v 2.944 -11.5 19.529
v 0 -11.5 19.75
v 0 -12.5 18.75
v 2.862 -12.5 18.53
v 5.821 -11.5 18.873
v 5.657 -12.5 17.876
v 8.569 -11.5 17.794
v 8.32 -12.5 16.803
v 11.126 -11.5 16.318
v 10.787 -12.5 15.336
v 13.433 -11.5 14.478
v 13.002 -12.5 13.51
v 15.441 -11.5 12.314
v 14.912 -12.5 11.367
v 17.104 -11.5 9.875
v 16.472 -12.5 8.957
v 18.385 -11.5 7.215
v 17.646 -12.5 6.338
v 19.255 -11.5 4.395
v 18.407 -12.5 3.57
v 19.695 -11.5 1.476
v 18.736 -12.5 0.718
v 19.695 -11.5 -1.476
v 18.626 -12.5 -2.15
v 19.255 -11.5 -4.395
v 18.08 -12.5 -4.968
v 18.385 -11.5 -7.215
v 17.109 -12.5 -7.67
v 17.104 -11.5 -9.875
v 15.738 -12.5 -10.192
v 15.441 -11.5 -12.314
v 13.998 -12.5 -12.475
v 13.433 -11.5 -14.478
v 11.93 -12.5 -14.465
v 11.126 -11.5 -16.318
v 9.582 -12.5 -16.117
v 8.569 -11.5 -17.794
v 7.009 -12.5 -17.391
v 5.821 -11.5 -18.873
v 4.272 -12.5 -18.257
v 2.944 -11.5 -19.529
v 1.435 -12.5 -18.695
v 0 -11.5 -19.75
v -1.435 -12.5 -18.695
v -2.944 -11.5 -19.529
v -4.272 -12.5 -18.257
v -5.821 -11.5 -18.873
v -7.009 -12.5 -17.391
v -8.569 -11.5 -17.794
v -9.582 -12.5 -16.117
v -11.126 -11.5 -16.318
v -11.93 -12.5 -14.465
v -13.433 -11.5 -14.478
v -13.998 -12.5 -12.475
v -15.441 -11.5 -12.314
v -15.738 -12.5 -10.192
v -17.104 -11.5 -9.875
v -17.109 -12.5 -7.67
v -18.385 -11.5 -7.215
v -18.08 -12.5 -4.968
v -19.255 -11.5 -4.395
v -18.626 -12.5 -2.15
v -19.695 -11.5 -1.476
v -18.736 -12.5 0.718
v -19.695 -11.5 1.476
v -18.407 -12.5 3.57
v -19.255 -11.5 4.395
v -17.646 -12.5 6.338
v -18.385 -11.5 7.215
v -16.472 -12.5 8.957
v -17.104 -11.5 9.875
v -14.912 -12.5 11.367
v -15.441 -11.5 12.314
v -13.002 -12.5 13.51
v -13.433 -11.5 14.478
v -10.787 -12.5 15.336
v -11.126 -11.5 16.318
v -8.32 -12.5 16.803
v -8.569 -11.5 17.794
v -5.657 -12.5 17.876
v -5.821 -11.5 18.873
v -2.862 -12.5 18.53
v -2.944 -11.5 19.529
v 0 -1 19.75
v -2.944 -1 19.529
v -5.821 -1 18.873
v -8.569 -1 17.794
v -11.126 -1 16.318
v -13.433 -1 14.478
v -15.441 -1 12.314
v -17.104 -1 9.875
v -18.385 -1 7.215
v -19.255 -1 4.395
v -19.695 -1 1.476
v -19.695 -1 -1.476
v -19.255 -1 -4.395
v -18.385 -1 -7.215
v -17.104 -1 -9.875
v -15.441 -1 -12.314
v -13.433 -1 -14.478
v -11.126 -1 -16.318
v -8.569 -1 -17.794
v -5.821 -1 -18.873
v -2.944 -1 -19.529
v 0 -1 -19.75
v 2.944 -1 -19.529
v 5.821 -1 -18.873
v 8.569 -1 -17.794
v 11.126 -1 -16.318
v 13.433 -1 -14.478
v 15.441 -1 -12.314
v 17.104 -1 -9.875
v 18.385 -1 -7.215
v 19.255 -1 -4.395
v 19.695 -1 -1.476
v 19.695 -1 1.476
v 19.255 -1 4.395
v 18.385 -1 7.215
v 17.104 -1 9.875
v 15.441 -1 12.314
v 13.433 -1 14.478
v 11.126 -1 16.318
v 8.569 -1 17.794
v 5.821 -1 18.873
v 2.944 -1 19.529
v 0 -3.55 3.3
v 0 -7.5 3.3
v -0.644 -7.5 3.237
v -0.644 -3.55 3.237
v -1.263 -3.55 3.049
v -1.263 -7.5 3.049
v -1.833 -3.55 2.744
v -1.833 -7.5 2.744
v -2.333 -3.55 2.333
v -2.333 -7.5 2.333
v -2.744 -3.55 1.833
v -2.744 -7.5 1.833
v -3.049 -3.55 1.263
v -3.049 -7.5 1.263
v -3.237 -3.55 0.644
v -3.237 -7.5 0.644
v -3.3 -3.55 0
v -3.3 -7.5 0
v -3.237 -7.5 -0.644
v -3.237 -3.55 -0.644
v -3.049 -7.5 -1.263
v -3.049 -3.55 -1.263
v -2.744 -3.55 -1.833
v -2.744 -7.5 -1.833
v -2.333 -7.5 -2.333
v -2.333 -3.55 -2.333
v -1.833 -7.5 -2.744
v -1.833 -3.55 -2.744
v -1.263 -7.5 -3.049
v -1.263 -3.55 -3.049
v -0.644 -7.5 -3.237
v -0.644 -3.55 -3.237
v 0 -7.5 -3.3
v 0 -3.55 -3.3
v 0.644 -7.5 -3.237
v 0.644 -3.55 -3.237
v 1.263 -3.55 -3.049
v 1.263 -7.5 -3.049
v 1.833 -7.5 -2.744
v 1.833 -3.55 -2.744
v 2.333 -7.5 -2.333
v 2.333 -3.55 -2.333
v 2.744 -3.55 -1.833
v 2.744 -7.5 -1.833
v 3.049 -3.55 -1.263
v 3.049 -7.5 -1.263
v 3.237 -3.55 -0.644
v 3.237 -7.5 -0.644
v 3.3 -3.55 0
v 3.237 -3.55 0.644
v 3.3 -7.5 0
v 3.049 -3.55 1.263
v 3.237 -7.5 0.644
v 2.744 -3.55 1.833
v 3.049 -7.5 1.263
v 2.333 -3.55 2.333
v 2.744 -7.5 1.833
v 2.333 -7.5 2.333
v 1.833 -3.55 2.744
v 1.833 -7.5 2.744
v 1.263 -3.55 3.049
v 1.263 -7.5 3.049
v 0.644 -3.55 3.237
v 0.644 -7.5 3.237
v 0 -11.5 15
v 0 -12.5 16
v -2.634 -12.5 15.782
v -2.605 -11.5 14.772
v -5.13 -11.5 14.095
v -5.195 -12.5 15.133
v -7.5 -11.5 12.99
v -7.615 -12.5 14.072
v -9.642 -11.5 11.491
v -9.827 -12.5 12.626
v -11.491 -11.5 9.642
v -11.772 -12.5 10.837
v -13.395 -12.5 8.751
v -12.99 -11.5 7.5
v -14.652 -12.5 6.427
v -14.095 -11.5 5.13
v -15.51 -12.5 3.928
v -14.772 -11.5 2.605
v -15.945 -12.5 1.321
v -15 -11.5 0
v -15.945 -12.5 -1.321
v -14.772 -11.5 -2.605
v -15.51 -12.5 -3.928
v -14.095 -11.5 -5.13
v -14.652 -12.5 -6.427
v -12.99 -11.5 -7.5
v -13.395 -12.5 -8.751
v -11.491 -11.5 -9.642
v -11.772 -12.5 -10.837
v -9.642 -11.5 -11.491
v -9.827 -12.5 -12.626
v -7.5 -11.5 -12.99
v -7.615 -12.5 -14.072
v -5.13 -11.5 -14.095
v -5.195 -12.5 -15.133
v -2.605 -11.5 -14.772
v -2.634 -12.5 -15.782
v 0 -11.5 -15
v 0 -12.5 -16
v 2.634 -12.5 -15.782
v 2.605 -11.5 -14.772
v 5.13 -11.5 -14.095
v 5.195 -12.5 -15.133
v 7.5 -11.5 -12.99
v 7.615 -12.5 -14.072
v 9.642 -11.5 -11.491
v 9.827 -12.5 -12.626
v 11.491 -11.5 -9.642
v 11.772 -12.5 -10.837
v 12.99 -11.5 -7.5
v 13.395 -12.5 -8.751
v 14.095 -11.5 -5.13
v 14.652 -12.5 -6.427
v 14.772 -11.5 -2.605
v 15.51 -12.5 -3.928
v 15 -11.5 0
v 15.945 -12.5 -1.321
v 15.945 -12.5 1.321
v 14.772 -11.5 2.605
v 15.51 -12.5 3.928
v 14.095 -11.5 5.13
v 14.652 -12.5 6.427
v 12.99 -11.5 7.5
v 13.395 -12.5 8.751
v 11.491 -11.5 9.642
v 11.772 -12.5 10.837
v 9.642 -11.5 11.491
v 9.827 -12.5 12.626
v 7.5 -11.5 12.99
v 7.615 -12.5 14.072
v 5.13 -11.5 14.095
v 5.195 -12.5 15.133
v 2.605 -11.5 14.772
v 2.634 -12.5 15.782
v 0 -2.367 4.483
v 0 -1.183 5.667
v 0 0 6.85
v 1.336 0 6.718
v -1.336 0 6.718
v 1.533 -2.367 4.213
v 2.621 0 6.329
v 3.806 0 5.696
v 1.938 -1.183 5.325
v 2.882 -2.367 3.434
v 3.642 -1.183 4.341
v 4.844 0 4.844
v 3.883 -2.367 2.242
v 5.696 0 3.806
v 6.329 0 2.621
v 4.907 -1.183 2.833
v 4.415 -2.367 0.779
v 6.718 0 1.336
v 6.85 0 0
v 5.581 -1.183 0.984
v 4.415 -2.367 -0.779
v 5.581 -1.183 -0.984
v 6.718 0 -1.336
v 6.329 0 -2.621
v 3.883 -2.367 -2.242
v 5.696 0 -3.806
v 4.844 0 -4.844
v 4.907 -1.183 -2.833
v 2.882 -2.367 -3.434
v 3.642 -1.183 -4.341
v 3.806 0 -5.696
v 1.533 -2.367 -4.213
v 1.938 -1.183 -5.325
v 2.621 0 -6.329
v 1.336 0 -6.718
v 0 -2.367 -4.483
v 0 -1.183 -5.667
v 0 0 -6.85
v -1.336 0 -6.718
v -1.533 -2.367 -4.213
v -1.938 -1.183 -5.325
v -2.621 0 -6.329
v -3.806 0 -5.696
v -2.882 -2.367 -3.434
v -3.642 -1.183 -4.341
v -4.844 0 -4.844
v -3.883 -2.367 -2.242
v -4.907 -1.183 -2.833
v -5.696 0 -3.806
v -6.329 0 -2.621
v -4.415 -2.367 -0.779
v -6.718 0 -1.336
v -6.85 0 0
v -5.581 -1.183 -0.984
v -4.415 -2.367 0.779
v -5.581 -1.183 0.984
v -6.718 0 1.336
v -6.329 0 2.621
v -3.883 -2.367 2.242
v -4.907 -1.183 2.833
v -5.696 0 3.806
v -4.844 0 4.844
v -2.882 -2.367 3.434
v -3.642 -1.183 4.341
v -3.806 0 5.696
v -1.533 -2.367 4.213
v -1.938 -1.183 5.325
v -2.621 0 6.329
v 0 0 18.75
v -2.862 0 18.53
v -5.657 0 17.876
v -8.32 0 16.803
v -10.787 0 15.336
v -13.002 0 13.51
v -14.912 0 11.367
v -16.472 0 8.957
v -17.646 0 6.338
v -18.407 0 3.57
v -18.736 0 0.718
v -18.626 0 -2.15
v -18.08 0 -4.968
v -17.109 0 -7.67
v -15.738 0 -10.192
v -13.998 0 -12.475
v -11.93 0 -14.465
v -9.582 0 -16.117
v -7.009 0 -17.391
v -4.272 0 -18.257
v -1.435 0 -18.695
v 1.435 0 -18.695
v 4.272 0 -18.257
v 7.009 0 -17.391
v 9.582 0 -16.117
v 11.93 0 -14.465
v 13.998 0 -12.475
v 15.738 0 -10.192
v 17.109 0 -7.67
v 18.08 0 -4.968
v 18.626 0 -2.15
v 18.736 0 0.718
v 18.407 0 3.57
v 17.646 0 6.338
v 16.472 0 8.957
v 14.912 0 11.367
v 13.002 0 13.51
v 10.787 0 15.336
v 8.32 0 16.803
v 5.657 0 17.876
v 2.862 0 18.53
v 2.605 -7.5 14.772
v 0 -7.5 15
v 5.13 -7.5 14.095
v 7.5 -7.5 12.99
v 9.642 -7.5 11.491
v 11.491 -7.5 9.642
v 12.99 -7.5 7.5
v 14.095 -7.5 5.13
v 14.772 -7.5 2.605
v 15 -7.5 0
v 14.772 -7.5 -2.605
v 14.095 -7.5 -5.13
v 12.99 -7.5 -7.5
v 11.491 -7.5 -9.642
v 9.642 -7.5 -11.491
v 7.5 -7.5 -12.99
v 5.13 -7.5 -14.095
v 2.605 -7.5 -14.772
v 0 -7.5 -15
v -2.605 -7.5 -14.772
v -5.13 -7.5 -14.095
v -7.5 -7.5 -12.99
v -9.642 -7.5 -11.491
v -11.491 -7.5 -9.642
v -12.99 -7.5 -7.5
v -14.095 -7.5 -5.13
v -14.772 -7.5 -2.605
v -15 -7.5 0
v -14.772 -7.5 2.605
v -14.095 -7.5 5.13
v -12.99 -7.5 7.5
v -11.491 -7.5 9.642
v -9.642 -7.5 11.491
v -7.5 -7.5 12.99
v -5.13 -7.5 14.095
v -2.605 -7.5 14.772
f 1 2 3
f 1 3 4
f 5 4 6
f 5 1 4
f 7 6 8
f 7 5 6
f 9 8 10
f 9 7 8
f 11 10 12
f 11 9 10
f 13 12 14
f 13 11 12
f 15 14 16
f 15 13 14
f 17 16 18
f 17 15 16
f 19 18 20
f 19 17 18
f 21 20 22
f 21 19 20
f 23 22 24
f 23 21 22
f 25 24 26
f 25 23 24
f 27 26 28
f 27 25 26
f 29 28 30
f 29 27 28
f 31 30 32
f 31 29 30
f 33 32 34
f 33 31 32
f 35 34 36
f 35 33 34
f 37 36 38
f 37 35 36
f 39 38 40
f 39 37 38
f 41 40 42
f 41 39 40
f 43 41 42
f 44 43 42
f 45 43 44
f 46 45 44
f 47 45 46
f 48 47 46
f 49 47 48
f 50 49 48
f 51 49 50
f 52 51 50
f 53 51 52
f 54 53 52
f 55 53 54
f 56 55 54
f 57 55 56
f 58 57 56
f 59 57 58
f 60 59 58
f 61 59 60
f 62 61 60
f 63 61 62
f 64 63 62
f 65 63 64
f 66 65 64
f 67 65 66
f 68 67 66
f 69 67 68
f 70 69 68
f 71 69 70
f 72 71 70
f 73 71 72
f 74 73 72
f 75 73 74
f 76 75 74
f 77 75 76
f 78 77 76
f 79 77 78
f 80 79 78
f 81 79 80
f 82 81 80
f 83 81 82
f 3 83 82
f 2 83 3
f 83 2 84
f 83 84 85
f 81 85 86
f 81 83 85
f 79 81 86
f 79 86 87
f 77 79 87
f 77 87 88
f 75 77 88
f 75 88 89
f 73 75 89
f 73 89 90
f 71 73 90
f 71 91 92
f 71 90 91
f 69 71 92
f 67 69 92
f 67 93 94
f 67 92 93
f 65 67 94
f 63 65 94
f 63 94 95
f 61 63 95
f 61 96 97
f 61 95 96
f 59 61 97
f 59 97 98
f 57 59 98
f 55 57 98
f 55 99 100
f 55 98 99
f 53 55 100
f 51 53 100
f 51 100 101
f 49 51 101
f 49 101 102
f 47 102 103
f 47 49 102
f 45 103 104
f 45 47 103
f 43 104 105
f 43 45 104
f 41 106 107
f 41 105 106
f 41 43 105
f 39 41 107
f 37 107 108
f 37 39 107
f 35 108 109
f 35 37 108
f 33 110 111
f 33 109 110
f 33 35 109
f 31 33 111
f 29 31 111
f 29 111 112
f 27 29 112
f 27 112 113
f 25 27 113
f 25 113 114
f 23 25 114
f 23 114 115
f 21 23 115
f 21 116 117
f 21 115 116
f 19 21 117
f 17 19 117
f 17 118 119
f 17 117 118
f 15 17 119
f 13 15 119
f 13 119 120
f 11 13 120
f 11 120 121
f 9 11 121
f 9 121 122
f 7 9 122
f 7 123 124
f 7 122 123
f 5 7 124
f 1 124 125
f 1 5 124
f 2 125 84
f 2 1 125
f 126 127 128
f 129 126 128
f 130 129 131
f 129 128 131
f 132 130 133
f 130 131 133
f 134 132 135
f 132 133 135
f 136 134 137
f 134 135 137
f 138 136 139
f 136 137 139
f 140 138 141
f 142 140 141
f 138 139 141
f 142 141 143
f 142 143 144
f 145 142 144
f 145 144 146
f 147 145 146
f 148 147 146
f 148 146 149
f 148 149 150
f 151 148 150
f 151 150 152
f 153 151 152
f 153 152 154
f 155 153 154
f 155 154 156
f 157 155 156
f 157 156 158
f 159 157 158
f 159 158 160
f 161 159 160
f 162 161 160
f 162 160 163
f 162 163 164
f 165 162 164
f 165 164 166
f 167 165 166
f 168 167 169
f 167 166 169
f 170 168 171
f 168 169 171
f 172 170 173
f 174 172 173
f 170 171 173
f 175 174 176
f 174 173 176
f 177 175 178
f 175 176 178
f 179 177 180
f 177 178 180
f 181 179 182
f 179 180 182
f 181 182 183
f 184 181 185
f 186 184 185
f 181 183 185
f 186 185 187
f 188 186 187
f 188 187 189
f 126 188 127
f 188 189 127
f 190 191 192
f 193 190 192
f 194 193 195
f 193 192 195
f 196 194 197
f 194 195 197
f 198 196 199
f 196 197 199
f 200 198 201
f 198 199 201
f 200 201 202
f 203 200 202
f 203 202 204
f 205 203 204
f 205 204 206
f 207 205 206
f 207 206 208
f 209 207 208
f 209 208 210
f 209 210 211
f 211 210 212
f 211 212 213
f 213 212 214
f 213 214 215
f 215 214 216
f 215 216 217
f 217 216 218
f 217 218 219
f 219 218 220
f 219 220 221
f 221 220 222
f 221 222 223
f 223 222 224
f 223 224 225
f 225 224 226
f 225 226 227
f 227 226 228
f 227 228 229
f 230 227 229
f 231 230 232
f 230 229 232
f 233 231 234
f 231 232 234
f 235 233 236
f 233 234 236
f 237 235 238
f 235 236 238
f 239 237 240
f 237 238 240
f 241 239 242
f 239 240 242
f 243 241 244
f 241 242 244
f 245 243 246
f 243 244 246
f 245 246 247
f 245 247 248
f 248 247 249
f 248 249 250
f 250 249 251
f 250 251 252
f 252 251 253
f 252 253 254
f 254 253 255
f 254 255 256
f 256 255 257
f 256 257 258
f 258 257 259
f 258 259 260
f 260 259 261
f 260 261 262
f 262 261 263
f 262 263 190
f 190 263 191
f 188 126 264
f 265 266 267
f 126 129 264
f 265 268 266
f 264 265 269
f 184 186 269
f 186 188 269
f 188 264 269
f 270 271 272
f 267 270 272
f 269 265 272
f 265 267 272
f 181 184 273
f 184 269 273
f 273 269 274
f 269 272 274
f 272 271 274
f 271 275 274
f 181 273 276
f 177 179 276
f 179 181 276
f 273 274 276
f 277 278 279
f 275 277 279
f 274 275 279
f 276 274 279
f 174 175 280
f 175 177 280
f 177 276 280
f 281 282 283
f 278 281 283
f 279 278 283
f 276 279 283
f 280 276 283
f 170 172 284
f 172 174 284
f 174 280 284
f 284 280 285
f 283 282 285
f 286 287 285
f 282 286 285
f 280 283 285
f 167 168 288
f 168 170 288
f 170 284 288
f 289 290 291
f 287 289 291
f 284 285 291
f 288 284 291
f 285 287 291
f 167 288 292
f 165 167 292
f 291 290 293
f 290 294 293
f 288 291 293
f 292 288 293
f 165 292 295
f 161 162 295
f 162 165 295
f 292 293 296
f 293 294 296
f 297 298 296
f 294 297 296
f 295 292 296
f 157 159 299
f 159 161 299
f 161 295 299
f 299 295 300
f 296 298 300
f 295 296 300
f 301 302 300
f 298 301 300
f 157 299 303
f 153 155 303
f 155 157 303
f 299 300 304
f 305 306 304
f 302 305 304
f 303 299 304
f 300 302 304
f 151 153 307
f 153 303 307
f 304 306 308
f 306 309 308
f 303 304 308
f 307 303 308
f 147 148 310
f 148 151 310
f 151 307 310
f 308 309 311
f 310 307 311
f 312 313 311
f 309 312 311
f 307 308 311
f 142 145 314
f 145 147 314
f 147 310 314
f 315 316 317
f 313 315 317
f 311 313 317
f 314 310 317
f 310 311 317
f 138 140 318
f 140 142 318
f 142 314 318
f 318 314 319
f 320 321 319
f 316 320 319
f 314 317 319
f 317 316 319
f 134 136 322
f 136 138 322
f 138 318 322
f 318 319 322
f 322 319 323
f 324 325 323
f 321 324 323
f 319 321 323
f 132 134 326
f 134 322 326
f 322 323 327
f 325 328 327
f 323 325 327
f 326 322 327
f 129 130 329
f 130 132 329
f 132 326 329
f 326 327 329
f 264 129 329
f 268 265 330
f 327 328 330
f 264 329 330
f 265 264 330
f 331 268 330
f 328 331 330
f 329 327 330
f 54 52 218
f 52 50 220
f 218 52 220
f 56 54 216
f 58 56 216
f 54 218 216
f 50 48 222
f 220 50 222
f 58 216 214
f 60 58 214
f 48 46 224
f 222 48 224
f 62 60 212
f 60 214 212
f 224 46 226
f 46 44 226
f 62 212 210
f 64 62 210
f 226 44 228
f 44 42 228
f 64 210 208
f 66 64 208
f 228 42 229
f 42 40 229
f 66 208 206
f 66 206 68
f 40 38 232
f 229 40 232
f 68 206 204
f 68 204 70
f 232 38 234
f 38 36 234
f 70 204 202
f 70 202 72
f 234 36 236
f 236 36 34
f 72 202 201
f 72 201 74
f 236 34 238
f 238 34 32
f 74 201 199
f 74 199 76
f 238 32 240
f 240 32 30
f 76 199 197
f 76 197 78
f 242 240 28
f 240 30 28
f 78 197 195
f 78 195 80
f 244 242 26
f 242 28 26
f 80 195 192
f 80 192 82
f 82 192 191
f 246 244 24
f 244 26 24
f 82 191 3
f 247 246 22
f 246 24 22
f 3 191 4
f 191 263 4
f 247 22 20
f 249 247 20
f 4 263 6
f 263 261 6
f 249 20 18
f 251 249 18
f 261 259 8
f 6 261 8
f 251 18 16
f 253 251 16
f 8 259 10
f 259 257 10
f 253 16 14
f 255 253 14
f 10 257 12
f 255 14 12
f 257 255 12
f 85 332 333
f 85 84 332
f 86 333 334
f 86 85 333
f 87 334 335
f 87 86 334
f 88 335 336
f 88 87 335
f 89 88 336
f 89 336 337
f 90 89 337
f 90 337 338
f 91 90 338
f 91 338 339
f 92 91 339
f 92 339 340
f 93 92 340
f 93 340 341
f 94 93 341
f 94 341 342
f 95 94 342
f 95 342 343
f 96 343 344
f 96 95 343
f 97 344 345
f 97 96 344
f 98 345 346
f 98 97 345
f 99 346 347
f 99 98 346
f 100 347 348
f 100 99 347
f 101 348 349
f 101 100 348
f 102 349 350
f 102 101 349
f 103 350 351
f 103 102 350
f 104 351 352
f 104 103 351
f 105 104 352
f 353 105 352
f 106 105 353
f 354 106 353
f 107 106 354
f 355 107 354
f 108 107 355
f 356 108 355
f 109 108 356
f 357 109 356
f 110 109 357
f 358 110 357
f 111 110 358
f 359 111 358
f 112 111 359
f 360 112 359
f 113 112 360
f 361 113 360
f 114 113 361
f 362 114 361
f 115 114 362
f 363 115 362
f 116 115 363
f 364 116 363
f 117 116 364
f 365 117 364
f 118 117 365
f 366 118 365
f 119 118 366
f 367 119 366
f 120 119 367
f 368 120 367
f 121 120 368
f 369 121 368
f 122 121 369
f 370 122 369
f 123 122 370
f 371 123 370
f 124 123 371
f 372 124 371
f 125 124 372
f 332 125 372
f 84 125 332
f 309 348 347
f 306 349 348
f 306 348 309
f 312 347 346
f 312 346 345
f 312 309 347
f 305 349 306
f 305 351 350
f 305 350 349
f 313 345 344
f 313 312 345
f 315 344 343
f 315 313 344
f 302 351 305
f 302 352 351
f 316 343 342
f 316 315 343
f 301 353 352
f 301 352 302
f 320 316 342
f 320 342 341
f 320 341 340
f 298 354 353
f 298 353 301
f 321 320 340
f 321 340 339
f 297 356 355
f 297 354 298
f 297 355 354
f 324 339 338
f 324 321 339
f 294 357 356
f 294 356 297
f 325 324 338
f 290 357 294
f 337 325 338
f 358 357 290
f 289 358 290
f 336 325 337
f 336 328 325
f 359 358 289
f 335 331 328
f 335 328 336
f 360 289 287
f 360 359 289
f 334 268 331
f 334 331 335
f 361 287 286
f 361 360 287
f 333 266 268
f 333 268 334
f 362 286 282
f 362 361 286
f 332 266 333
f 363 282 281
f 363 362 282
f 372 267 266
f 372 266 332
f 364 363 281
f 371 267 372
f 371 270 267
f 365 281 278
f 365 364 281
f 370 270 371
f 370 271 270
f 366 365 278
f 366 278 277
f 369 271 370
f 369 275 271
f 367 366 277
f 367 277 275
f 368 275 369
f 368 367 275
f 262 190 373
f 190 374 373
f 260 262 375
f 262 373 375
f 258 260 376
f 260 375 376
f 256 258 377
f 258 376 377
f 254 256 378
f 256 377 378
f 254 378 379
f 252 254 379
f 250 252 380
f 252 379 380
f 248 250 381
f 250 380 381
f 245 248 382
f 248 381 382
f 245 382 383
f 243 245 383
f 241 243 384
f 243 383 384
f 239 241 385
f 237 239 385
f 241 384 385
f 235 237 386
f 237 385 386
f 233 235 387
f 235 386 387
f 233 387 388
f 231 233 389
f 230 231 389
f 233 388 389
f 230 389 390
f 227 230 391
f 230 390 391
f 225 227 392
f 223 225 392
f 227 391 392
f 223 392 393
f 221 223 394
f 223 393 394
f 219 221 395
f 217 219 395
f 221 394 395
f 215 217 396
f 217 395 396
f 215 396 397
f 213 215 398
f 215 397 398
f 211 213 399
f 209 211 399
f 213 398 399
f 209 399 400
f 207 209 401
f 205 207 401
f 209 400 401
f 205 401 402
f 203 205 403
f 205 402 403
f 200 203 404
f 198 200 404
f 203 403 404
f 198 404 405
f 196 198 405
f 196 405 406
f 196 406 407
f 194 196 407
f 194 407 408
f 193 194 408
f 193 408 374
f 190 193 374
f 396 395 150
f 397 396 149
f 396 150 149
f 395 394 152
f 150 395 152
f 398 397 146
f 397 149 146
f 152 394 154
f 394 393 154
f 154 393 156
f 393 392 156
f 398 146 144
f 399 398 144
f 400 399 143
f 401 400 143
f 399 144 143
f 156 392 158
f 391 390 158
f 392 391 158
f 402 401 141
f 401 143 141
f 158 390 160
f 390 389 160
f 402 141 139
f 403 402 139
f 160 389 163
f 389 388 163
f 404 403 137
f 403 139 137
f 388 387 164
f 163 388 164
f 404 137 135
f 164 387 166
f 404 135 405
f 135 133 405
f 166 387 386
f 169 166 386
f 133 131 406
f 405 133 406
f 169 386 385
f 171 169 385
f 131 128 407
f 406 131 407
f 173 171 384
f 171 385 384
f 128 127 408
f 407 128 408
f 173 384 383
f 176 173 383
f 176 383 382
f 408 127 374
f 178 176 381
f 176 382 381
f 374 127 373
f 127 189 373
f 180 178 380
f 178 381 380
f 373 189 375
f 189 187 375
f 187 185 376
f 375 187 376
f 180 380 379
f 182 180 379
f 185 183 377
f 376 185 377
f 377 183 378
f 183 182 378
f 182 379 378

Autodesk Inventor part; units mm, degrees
ref_plane "YZ Plane" through (0, 0, 0) normal (1, 0, 0) x (0, 1, 0)
ref_plane "XZ Plane" through (0, 0, 0) normal (0, 1, 0) x (-1, 0, 0)
ref_plane "XY Plane" through (0, 0, 0) normal (0, 0, 1) x (1, 0, 0)
sketch "Skizze1" plane through (0, 0, 0) normal (1, 0, 0) x (0, 1, 0)
  line L0 (-15, 0) -> (2.5, 0) projected
  line L1 (0, 23.7) -> (0, -3.95) construction
  line L2 (0, 0) -> (0, 19.75)
  line L3 (0, 19.75) -> (-12.5, 19.75)
  line L4 (-12.5, 19.75) -> (-12.5, 15)
  line L5 (-12.5, 15) -> (-7.5, 15)
  line L6 (-7.5, 15) -> (-7.5, 0)
  line L7 (0, 0) -> (-7.5, 0)
  dimension "d0" = 12.5
  dimension "d1" = 39.5
  dimension "d2" = 30
  dimension "d3" = 5
revolve "Grundkoerper" add sketch "Skizze1" angle 360 about axis through (0, 0, 0) along (0, 1, 0)
sketch "Skizze2" plane through (0, 0, 0) normal (0, 1, 0) x (1, 0, 0)
  line L0 (0, 27.65) -> (0, -27.65) construction
  line L1 (27.65, 0) -> (-27.65, 0) construction
  point P0 (0, 0)
  point P1 (0, 0)
hole "BOH_M6_ISO10642" at (0, 0, 0) direction (0, -1, 0) diameter 6.6 end through all countersink diameter 13.7 countersink angle 90
chamfer "Fase1" distance 1 angle 45 3 edges at (0, -12.5, -15) (0, -12.5, -19.75) (0, 0, -19.75)
properties part number "200-20-ROCKER-CONNECTOR-02" material "Aluminium 6061"
